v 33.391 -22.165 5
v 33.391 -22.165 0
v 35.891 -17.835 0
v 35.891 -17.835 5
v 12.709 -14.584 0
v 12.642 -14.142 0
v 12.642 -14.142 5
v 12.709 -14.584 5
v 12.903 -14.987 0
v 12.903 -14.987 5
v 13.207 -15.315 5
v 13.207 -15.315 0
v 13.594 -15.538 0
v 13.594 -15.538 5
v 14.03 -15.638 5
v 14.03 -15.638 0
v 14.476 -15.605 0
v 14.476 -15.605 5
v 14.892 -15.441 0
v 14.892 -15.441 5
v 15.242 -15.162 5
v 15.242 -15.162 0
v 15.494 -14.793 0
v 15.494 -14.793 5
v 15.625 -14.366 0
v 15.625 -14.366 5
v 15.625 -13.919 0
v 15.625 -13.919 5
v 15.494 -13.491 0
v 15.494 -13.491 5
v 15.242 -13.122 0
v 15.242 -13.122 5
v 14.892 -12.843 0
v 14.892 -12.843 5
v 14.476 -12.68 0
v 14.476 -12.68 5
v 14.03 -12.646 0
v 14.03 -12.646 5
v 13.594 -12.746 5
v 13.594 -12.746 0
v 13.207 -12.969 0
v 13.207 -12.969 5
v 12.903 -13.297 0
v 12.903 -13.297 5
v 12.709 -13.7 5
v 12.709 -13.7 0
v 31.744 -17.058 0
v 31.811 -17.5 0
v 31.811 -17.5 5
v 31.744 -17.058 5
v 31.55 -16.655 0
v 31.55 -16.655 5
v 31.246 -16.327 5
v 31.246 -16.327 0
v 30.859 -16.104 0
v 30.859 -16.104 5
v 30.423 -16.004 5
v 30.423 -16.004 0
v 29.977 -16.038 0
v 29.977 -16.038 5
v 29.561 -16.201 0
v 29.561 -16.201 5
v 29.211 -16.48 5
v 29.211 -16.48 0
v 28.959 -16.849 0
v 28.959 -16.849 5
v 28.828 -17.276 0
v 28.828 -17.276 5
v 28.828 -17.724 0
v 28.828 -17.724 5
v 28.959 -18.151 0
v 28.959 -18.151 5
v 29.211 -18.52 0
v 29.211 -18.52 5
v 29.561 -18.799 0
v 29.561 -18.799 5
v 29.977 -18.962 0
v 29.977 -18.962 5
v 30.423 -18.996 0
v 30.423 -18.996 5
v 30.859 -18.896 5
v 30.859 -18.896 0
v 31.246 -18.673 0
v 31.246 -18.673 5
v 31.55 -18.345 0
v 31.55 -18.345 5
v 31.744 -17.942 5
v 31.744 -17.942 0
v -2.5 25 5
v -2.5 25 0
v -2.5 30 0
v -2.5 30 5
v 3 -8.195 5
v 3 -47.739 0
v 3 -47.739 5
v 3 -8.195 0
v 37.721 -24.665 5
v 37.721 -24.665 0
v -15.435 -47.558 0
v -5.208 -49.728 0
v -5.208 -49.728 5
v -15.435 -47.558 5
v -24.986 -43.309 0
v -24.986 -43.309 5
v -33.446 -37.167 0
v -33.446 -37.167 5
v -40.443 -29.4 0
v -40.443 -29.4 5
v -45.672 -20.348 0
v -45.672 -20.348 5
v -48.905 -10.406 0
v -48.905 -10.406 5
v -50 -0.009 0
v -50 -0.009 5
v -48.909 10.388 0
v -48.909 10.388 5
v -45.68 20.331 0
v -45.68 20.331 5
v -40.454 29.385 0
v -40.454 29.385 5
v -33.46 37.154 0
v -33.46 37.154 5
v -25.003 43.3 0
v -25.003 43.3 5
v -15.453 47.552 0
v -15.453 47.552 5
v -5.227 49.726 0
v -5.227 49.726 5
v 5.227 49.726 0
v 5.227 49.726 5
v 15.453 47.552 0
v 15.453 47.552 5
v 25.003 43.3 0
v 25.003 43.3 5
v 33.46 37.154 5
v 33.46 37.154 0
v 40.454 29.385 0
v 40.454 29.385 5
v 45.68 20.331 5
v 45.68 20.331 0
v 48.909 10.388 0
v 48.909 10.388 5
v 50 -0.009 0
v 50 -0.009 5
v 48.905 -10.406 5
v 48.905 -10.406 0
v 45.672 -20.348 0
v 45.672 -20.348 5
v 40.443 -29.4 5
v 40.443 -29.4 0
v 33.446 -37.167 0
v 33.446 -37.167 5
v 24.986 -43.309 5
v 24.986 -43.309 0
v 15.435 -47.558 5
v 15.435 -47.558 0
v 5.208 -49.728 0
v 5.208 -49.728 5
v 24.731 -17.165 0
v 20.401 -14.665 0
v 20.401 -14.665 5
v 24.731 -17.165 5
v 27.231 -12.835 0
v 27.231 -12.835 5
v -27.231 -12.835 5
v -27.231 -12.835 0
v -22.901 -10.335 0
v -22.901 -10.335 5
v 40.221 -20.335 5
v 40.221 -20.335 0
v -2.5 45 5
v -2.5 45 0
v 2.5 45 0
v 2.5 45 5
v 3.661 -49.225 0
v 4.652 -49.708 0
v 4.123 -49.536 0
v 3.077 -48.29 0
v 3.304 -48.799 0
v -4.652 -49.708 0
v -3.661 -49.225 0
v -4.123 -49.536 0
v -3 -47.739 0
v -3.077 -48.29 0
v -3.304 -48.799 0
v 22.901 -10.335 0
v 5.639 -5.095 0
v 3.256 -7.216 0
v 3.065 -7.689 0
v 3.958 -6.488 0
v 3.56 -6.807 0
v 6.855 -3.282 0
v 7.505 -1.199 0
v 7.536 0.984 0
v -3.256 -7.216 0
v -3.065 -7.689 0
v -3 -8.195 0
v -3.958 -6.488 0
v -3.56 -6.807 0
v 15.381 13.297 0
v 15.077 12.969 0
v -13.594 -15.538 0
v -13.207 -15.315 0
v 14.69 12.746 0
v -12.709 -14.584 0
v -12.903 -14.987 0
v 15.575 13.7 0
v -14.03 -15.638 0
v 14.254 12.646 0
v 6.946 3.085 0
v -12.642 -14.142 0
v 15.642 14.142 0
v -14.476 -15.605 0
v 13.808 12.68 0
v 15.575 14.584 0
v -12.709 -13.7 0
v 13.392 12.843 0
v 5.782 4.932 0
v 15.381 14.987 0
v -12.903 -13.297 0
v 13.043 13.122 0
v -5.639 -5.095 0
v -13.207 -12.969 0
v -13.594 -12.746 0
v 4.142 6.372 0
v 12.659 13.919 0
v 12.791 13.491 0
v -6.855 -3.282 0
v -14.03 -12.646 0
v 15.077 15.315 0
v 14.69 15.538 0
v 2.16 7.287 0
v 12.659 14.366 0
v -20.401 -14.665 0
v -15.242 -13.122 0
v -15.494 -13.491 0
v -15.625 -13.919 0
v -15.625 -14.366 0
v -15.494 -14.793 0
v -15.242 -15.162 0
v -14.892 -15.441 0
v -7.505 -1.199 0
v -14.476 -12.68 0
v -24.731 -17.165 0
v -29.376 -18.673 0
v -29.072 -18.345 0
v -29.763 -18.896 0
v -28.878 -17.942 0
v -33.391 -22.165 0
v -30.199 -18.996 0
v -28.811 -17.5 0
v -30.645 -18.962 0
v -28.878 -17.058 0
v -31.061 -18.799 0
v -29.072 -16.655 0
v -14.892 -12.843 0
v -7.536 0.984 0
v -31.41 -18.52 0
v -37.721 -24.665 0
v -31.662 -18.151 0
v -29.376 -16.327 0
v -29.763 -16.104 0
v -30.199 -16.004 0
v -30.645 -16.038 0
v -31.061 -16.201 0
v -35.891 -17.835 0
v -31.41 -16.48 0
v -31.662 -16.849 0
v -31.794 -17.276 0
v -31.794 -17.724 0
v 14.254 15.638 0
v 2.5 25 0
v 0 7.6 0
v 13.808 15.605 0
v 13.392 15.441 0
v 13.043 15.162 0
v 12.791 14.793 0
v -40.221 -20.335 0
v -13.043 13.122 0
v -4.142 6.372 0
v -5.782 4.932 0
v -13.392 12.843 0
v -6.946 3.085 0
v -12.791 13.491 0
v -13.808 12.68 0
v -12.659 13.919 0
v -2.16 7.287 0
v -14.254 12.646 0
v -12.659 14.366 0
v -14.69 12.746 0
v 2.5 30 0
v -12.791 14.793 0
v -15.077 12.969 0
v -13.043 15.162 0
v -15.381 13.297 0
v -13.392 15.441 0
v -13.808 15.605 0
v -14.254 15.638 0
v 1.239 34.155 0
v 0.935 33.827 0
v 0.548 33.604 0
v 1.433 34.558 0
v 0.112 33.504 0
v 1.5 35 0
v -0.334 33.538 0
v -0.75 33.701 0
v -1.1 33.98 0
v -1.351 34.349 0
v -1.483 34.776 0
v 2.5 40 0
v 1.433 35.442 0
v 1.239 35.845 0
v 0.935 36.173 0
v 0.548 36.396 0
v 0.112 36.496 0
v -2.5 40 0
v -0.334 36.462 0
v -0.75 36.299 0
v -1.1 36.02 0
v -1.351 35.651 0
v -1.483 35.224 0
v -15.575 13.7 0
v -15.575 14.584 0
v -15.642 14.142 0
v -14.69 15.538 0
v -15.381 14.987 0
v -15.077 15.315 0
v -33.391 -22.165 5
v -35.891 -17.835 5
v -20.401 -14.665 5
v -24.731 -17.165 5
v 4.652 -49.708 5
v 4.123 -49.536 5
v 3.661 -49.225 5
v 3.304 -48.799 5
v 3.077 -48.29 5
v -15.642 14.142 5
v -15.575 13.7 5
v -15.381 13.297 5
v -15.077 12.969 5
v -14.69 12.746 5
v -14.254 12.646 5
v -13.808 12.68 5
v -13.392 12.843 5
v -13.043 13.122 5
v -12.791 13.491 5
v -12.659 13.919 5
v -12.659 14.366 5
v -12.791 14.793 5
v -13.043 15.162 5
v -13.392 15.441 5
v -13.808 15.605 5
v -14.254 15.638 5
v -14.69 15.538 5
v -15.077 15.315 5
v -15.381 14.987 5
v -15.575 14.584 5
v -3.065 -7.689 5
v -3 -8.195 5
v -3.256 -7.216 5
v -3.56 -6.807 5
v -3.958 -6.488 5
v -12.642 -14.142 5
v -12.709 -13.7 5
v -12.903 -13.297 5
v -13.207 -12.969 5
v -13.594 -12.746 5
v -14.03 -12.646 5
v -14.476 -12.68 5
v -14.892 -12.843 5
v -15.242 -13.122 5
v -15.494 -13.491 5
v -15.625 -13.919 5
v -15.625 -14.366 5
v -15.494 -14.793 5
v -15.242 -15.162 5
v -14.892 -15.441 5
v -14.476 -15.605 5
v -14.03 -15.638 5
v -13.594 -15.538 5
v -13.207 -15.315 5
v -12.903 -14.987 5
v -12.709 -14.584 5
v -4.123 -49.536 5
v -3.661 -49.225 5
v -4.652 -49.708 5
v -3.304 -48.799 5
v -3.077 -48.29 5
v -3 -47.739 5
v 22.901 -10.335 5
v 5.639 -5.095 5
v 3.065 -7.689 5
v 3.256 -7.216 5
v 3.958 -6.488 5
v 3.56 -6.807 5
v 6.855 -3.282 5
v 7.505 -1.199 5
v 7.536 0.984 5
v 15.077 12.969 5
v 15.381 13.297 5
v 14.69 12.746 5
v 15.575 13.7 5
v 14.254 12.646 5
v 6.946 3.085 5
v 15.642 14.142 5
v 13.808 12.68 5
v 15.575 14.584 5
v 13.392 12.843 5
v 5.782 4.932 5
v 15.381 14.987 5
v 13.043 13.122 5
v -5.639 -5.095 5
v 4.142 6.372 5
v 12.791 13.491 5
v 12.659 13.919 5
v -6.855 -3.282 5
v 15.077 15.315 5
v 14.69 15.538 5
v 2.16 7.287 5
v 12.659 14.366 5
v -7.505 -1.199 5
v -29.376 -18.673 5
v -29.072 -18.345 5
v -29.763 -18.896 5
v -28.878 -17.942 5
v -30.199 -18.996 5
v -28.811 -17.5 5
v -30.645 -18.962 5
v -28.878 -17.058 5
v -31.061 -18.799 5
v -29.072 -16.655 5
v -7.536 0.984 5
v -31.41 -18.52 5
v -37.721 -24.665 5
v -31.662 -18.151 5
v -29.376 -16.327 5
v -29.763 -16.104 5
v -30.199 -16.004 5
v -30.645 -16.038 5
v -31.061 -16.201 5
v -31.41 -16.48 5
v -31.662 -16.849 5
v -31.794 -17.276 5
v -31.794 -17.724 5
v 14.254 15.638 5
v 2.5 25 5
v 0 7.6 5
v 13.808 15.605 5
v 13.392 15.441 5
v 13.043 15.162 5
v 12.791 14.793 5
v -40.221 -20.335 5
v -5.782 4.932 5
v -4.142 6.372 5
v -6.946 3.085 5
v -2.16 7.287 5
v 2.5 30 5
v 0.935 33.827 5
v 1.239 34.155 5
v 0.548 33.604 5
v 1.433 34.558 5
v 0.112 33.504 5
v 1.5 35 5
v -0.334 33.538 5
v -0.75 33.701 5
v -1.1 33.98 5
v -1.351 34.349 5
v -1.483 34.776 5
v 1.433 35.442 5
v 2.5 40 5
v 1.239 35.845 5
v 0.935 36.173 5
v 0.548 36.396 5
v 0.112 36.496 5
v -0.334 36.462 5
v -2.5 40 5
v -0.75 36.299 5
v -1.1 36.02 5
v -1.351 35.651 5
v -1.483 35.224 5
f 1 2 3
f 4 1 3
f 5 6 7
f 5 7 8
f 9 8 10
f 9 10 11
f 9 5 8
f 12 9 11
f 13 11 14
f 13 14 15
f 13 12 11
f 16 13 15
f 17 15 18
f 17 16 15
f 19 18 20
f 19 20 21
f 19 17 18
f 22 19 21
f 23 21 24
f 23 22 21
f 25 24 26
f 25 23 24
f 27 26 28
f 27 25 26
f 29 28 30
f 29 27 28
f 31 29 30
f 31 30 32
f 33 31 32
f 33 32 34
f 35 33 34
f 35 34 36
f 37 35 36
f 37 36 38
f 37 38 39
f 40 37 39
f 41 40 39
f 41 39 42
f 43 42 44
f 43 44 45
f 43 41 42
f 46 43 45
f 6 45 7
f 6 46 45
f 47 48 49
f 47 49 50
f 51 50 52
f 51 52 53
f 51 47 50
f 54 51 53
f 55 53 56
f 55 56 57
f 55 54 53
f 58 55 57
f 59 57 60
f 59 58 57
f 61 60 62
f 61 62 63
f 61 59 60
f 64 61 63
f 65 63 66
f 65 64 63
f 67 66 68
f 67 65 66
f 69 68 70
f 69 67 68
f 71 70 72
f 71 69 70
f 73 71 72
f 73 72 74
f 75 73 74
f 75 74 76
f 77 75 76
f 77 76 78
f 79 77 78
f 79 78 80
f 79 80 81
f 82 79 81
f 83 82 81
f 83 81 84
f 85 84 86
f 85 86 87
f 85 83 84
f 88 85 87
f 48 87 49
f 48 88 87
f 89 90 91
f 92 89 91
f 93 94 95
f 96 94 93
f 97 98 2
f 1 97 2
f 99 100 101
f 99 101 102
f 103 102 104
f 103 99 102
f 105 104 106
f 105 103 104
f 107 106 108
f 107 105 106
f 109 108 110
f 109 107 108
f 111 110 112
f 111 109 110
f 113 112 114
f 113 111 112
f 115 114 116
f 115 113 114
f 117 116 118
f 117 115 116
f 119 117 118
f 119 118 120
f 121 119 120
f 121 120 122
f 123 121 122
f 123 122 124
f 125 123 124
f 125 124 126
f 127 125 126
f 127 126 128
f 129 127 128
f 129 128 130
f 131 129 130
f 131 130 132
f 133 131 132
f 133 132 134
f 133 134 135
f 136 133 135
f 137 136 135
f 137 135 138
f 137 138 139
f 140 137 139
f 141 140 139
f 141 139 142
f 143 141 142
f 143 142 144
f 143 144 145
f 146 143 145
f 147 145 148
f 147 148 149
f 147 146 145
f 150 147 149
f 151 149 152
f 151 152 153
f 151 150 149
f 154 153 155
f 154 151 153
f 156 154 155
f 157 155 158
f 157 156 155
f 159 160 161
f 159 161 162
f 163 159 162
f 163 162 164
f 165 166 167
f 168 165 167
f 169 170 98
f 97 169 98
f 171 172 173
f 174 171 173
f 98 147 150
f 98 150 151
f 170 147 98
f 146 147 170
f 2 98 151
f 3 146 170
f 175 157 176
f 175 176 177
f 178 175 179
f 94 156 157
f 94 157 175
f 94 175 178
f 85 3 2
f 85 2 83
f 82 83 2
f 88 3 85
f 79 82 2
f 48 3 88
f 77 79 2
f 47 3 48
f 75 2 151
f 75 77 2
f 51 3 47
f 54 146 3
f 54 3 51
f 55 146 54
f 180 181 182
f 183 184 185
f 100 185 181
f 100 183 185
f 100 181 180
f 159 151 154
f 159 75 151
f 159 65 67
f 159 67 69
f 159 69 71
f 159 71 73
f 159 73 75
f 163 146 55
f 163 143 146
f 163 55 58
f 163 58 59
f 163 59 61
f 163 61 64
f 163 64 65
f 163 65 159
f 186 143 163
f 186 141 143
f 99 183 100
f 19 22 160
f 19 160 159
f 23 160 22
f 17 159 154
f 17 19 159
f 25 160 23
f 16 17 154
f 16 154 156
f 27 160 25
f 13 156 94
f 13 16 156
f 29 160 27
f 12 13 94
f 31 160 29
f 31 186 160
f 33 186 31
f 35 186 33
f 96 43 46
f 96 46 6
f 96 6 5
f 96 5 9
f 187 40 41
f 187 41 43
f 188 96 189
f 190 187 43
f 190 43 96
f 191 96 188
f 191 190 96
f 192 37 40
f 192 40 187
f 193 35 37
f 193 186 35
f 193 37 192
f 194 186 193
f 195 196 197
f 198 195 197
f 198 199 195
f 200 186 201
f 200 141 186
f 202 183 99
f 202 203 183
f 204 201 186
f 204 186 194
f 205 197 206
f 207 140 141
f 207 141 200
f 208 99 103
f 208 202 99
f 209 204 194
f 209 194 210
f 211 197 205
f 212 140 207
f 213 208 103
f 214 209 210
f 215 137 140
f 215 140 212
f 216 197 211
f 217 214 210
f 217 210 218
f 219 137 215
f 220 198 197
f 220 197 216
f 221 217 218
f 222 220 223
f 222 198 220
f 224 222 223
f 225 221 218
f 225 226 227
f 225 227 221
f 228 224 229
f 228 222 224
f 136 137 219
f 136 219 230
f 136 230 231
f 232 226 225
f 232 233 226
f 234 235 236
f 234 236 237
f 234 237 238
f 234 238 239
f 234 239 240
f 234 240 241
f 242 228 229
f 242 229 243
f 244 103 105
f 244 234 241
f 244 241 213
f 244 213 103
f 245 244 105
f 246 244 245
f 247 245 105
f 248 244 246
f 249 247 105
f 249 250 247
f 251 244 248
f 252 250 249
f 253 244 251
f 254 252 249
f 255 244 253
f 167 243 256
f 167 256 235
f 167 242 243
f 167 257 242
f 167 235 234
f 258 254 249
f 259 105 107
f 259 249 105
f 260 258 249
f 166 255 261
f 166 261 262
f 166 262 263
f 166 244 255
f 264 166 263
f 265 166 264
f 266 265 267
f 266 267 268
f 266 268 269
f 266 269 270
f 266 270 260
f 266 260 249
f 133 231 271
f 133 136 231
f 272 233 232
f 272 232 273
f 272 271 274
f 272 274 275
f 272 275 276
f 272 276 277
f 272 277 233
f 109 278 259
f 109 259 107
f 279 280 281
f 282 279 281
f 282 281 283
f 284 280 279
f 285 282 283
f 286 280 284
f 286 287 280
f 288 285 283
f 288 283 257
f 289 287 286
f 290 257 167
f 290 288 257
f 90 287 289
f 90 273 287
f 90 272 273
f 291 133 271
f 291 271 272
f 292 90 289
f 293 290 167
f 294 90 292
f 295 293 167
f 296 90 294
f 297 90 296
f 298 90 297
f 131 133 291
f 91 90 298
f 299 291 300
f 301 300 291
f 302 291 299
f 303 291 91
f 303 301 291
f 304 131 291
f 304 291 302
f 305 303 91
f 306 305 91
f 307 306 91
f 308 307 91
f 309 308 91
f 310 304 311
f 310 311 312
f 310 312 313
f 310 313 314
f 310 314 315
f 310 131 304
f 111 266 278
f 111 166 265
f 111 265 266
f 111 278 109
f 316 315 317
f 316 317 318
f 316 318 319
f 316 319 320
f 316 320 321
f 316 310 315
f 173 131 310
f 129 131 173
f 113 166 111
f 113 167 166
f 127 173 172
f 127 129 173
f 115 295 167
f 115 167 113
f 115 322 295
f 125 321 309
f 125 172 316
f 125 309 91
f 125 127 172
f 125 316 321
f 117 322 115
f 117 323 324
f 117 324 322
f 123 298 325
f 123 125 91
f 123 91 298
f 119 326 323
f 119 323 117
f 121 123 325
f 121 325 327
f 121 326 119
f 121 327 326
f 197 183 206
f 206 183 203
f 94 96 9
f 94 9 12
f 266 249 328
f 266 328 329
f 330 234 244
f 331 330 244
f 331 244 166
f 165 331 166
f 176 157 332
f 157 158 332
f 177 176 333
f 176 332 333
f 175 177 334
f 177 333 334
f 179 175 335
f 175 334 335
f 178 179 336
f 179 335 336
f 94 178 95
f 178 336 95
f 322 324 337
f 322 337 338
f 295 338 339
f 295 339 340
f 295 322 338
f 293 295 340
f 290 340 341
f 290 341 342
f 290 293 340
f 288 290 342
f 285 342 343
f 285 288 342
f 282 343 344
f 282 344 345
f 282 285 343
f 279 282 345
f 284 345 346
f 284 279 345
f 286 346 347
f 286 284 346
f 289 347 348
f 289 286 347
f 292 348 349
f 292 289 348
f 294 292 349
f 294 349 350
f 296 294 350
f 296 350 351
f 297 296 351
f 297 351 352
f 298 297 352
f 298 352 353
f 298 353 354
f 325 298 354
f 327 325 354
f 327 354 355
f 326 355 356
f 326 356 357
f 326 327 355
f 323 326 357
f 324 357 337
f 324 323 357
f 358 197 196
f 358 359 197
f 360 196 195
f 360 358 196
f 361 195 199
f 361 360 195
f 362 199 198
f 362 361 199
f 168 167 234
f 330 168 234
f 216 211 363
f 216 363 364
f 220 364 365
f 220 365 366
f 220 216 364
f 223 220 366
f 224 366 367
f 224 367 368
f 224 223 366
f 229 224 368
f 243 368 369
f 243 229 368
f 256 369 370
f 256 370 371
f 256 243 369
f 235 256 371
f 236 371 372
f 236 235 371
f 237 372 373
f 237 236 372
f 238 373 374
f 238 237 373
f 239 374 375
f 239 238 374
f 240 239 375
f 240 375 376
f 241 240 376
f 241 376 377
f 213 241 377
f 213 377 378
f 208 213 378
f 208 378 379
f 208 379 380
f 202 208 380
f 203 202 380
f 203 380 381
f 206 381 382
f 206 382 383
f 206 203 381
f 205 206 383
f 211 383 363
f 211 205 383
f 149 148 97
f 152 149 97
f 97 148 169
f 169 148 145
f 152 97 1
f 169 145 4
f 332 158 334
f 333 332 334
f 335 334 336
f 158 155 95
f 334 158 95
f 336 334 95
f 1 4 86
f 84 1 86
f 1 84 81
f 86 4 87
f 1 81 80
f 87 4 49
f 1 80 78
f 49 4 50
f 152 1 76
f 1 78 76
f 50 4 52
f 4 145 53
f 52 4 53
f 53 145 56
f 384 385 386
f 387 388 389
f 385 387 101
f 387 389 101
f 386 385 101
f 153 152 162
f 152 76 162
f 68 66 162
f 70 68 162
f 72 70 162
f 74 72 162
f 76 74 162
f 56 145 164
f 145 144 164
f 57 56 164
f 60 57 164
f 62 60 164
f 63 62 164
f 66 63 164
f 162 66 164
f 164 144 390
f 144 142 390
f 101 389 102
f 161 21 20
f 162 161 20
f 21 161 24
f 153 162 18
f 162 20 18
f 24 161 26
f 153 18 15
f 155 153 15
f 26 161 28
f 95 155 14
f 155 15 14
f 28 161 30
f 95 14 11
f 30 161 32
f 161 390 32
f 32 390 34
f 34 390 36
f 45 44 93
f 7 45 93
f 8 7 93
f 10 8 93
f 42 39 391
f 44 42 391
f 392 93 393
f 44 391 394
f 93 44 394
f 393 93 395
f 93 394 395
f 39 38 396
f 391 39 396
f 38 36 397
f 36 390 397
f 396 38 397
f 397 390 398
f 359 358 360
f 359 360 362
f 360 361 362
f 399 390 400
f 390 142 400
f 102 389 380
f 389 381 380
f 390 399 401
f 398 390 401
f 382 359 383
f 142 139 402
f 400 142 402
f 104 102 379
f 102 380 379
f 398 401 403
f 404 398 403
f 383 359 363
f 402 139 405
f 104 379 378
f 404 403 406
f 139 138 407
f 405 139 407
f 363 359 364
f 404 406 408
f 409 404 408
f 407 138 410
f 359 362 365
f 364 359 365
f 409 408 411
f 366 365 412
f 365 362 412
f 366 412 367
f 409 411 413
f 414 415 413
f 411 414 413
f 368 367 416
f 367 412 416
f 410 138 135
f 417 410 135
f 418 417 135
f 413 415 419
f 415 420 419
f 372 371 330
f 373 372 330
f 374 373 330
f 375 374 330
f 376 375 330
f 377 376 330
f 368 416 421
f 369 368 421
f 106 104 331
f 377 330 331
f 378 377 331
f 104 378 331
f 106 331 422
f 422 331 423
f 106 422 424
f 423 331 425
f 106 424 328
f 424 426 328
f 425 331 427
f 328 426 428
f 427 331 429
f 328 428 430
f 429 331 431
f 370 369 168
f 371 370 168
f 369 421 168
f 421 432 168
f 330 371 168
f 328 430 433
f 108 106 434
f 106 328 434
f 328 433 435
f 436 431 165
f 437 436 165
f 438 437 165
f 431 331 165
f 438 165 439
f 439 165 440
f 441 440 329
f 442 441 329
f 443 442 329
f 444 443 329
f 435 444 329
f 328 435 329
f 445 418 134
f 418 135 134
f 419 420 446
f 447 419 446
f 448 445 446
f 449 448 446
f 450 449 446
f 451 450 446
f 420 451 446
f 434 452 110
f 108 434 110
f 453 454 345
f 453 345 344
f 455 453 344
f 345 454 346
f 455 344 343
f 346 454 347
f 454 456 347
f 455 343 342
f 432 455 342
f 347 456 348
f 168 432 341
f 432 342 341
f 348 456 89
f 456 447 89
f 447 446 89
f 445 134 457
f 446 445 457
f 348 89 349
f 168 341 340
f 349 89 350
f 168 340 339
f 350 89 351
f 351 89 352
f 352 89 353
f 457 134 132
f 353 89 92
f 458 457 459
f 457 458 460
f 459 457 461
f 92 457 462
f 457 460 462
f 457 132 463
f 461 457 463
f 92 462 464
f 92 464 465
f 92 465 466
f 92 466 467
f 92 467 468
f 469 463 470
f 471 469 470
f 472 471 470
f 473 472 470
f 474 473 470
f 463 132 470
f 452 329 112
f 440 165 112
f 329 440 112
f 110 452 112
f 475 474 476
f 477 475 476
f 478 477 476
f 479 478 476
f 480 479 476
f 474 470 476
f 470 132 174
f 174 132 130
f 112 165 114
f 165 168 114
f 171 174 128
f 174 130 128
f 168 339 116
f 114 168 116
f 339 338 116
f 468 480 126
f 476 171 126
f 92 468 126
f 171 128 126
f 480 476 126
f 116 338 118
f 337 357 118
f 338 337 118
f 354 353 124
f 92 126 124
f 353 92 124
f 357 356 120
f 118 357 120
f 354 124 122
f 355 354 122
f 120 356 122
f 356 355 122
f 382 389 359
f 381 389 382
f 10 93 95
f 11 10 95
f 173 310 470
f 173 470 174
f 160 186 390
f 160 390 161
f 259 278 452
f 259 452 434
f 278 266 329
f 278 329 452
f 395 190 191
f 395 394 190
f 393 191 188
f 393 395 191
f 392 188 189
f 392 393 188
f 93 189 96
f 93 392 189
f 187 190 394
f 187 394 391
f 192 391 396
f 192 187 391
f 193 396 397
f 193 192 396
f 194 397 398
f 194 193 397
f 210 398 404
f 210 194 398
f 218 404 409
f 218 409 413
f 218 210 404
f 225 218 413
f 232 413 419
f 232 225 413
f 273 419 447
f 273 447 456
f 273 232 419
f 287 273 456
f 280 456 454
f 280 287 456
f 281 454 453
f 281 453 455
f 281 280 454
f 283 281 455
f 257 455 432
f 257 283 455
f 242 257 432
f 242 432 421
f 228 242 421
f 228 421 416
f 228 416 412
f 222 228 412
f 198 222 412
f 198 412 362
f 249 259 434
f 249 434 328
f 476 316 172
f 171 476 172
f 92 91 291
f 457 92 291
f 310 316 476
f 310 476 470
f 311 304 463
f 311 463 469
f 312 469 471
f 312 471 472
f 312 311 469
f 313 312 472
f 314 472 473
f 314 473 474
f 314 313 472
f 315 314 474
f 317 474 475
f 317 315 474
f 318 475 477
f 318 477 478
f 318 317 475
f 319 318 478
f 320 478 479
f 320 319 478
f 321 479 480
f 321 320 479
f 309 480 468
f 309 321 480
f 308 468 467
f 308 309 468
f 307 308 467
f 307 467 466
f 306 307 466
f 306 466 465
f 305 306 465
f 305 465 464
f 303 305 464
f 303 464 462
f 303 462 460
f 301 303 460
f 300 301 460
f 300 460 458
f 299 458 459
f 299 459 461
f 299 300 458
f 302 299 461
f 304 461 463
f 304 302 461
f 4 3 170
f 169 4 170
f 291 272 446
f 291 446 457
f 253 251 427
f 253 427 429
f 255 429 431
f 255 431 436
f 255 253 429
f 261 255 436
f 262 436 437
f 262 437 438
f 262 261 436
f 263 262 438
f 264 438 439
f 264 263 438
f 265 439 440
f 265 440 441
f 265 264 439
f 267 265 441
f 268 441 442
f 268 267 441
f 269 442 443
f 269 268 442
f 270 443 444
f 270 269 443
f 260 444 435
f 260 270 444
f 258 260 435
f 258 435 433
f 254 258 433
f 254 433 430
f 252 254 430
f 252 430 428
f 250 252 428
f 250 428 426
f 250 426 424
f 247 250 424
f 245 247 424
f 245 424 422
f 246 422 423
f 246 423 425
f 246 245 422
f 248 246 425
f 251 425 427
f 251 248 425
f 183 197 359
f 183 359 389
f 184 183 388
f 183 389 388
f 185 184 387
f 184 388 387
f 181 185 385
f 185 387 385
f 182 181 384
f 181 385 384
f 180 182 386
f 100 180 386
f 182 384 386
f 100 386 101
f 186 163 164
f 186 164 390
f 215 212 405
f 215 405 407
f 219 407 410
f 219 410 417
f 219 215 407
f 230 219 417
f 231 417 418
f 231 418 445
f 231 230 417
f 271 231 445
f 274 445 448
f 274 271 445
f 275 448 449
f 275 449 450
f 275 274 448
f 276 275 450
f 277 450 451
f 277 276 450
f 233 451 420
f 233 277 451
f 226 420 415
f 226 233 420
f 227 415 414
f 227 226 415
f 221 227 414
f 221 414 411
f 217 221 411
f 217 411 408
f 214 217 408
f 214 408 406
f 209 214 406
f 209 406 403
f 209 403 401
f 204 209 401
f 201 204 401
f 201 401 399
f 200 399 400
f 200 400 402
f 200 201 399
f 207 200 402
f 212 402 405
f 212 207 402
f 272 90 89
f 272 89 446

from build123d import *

# Parameters (mm, degrees)
ESQUISSE1_R        = 1.5
ESQUISSE1_W        = 5
ESQUISSE1_H        = 5
BOSS_EXTRU_1_DEPTH = 5
FILLET1_R          = 2


with BuildPart() as part:
    # Esquisse1 → Boss.-Extru.1 (new body)
    with BuildSketch(Plane.XY):
        with BuildLine():
            Line((-3, -6.9828361), (-3, -49.909918854))
            ThreePointArc((-3, -49.909918854), (0, 50), (3, -49.909918854))
            Line((3, -49.909918854), (3, -6.9828361))
            ThreePointArc((3, -6.9828361), (0, 7.6), (-3, -6.9828361))
        make_face()
        with Locations((14.142135624, 14.142135624)):
            Circle(ESQUISSE1_R, mode=Mode.SUBTRACT)
        with Locations(Location((14.142135624, -14.142135624, 0), (0, 0, 180))):
            Circle(ESQUISSE1_R, mode=Mode.SUBTRACT)
        with Locations(Location((-14.142135624, 14.142135624, 0), (0, 0, 180))):
            Circle(ESQUISSE1_R, mode=Mode.SUBTRACT)
        with Locations((-14.142135624, -14.142135624)):
            Circle(ESQUISSE1_R, mode=Mode.SUBTRACT)
        with Locations((0, 35)):
            Circle(ESQUISSE1_R, mode=Mode.SUBTRACT)
        with Locations((-30.310889132, -17.5)):
            Circle(ESQUISSE1_R, mode=Mode.SUBTRACT)
        with Locations((30.310889132, -17.5)):
            Circle(ESQUISSE1_R, mode=Mode.SUBTRACT)
        with Locations((0, 27.5)):
            Rectangle(ESQUISSE1_W, ESQUISSE1_H, mode=Mode.SUBTRACT)
        with Locations((0, 42.5)):
            Rectangle(ESQUISSE1_W, ESQUISSE1_H, mode=Mode.SUBTRACT)
        Polygon((-35.891016151, -17.834936491), (-40.22114317, -20.334936491), (-37.72114317, -24.665063509), (-33.391016151, -22.165063509), align=None, mode=Mode.SUBTRACT)
        Polygon((-27.230762114, -12.834936491), (-22.900635095, -10.334936491), (-20.400635095, -14.665063509), (-24.730762114, -17.165063509), align=None, mode=Mode.SUBTRACT)
        Polygon((27.230762114, -12.834936491), (22.900635095, -10.334936491), (20.400635095, -14.665063509), (24.730762114, -17.165063509), align=None, mode=Mode.SUBTRACT)
        Polygon((35.891016151, -17.834936491), (40.22114317, -20.334936491), (37.72114317, -24.665063509), (33.391016151, -22.165063509), align=None, mode=Mode.SUBTRACT)
    extrude(amount=BOSS_EXTRU_1_DEPTH)

    # Fillet1
    fillet1_edges = [part.edges().sort_by_distance(p)[0] for p in [
        (-3, -6.9828361, 2.5),
        (-3, -49.909918854, 2.5),
        (3, -49.909918854, 2.5),
        (3, -6.9828361, 2.5),
    ]]
    fillet(fillet1_edges, radius=FILLET1_R)


solid = part.part
